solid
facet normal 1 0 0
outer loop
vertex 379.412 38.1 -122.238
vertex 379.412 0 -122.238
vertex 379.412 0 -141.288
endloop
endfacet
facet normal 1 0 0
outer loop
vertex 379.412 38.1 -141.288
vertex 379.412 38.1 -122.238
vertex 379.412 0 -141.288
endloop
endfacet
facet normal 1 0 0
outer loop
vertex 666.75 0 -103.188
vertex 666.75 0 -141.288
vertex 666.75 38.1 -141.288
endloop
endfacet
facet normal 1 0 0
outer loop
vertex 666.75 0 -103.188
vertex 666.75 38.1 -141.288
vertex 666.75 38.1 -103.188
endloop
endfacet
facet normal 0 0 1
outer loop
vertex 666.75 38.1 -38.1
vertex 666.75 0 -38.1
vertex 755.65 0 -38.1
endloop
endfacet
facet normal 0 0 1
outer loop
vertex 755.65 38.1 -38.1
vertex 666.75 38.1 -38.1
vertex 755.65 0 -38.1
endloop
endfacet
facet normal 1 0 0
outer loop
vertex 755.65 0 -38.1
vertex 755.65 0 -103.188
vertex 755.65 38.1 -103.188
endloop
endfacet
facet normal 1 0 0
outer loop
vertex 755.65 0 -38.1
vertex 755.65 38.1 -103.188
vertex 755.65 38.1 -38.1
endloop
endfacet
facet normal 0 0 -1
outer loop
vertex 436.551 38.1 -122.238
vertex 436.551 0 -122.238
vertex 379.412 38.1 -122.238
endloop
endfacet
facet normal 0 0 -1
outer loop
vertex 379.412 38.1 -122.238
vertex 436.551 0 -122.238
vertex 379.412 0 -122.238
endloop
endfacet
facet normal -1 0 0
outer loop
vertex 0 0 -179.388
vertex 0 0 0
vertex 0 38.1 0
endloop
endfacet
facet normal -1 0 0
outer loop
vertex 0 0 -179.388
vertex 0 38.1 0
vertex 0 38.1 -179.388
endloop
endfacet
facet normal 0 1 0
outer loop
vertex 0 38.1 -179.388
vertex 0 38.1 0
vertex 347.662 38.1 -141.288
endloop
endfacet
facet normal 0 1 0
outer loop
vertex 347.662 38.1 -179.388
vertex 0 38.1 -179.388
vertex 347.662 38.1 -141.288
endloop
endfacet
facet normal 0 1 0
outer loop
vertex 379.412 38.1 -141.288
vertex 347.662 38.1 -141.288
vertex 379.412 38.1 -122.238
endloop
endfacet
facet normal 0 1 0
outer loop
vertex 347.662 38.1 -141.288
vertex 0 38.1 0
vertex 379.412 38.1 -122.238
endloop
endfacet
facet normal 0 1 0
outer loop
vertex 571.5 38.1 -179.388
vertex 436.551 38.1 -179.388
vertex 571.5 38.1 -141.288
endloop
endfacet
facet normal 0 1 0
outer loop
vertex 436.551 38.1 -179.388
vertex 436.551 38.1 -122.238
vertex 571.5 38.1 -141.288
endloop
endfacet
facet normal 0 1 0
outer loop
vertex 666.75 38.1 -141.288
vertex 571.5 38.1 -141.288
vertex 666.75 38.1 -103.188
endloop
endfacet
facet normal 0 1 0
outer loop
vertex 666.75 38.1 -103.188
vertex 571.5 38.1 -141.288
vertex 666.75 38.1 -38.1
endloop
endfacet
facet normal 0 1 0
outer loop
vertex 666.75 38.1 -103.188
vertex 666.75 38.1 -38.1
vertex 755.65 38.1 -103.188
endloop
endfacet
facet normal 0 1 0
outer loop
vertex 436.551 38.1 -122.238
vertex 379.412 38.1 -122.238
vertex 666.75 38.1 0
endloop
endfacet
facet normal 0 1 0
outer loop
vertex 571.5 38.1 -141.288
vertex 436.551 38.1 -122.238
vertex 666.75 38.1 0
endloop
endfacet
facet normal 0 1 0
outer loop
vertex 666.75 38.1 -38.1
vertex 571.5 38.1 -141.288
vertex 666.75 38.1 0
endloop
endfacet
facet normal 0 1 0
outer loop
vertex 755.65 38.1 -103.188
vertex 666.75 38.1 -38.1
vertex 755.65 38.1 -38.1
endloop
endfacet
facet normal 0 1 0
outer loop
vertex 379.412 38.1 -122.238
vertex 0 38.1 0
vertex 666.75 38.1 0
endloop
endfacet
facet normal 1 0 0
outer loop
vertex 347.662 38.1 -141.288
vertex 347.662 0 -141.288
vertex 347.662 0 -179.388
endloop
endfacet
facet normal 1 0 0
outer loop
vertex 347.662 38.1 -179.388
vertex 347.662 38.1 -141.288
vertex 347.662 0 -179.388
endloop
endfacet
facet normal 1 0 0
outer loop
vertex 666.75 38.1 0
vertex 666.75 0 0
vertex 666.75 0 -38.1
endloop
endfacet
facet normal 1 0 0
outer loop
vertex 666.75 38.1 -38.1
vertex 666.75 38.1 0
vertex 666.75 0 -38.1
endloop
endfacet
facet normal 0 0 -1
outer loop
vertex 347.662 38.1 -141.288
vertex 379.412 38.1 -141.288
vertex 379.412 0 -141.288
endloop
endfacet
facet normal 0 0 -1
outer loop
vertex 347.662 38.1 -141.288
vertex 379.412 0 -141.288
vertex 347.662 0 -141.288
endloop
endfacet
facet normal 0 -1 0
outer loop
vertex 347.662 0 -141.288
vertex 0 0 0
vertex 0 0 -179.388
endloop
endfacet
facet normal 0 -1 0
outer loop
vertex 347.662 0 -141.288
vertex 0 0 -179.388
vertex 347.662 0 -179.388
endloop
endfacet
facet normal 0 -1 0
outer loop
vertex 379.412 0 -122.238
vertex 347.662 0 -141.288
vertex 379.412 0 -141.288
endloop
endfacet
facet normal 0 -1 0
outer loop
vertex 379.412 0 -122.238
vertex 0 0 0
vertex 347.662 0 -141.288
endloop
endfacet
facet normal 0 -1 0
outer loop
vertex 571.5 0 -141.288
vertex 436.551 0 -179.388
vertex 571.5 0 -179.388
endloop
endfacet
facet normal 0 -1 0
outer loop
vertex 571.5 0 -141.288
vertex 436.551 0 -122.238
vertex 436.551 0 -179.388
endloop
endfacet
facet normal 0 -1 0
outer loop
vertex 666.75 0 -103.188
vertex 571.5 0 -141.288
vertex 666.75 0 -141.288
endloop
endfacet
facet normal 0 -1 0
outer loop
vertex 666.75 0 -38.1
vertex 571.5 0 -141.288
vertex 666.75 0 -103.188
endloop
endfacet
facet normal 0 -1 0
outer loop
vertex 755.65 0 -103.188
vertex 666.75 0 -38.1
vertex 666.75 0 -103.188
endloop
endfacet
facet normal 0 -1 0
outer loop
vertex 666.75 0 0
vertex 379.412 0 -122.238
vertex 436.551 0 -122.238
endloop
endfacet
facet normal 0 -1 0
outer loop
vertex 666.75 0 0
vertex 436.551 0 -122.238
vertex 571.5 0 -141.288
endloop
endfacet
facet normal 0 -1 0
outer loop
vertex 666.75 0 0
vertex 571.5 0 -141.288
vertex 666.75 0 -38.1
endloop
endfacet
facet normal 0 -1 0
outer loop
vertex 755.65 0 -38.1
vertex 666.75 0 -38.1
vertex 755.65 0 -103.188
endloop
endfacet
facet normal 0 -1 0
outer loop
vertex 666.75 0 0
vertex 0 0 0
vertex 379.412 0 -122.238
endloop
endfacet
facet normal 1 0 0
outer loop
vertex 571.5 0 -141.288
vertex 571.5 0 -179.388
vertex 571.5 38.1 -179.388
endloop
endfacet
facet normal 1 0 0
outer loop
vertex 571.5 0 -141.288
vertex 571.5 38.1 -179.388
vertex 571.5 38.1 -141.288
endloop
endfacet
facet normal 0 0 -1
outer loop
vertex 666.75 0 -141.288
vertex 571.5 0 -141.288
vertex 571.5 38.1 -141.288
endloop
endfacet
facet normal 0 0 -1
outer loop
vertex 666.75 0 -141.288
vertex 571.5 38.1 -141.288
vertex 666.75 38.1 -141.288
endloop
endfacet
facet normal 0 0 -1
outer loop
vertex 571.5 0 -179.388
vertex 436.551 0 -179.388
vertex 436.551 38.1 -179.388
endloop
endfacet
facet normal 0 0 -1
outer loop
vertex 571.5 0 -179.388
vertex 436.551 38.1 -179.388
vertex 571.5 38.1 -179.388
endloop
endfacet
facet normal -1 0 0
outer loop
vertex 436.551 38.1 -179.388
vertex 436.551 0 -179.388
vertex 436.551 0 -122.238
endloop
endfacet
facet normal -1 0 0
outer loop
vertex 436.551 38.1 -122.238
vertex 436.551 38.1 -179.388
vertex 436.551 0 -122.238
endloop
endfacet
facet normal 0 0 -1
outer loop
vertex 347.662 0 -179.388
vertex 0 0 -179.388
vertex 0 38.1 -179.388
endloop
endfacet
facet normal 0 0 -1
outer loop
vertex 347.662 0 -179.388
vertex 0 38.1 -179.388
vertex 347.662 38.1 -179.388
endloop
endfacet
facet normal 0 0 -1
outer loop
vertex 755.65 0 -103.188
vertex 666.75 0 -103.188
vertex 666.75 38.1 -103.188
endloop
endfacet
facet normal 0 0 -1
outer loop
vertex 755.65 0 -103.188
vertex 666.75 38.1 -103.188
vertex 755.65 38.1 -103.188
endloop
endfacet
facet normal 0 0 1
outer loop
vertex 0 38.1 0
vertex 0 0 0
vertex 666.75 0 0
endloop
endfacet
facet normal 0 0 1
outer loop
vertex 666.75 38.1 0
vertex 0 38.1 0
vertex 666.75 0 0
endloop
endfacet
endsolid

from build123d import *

# Parameters (mm, degrees)
SKETCH1_W           = 666.75
SKETCH1_H           = 179.3875
BOSS_EXTRUDE1_DEPTH = 38.1
SKETCH2_W           = 88.9
SKETCH2_H           = 141.2875
BOSS_EXTRUDE2_DEPTH = 38.1
SKETCH3_W           = 184.15
SKETCH3_H           = 38.1
CUT_EXTRUDE1_DEPTH  = 39.1
CUT_EXTRUDE2_DEPTH  = 39.1
SKETCH5_W           = 88.9
SKETCH5_H           = 38.1
CUT_EXTRUDE3_DEPTH  = 39.1


with BuildPart() as part:
    # Sketch1 → Boss-Extrude1 (new body)
    with BuildSketch(Plane(origin=(0, 0, 0), x_dir=(1, 0, 0), z_dir=(0, 1, 0))):
        with Locations((333.375, 89.69375)):
            Rectangle(SKETCH1_W, SKETCH1_H)
    extrude(amount=BOSS_EXTRUDE1_DEPTH)

    # Sketch2 → Boss-Extrude2 (add, through all)
    with BuildSketch(Plane.XZ):
        with Locations((711.2, -108.74375)):
            Rectangle(SKETCH2_W, SKETCH2_H)
    extrude(amount=-BOSS_EXTRUDE2_DEPTH)

    # Sketch3 → Cut-Extrude1 (cut, through all)
    with BuildSketch(Plane.XZ):
        with Locations((663.575, -160.3375)):
            Rectangle(SKETCH3_W, SKETCH3_H)
    extrude(amount=-CUT_EXTRUDE1_DEPTH, mode=Mode.SUBTRACT)

    # Sketch4 → Cut-Extrude2 (cut, through all)
    with BuildSketch(Plane.XZ):
        Polygon((436.55104079, -141.2875), (436.55104079, -122.2375), (379.4125, -122.2375), (379.4125, -141.2875), (347.6625, -141.2875), (347.6625, -179.3875), (436.55104079, -179.3875), align=None)
    extrude(amount=-CUT_EXTRUDE2_DEPTH, mode=Mode.SUBTRACT)

    # Sketch5 → Cut-Extrude3 (cut, through all)
    with BuildSketch(Plane.XZ):
        with Locations((711.2, -122.2375)):
            Rectangle(SKETCH5_W, SKETCH5_H)
    extrude(amount=-CUT_EXTRUDE3_DEPTH, mode=Mode.SUBTRACT)


solid = part.part
